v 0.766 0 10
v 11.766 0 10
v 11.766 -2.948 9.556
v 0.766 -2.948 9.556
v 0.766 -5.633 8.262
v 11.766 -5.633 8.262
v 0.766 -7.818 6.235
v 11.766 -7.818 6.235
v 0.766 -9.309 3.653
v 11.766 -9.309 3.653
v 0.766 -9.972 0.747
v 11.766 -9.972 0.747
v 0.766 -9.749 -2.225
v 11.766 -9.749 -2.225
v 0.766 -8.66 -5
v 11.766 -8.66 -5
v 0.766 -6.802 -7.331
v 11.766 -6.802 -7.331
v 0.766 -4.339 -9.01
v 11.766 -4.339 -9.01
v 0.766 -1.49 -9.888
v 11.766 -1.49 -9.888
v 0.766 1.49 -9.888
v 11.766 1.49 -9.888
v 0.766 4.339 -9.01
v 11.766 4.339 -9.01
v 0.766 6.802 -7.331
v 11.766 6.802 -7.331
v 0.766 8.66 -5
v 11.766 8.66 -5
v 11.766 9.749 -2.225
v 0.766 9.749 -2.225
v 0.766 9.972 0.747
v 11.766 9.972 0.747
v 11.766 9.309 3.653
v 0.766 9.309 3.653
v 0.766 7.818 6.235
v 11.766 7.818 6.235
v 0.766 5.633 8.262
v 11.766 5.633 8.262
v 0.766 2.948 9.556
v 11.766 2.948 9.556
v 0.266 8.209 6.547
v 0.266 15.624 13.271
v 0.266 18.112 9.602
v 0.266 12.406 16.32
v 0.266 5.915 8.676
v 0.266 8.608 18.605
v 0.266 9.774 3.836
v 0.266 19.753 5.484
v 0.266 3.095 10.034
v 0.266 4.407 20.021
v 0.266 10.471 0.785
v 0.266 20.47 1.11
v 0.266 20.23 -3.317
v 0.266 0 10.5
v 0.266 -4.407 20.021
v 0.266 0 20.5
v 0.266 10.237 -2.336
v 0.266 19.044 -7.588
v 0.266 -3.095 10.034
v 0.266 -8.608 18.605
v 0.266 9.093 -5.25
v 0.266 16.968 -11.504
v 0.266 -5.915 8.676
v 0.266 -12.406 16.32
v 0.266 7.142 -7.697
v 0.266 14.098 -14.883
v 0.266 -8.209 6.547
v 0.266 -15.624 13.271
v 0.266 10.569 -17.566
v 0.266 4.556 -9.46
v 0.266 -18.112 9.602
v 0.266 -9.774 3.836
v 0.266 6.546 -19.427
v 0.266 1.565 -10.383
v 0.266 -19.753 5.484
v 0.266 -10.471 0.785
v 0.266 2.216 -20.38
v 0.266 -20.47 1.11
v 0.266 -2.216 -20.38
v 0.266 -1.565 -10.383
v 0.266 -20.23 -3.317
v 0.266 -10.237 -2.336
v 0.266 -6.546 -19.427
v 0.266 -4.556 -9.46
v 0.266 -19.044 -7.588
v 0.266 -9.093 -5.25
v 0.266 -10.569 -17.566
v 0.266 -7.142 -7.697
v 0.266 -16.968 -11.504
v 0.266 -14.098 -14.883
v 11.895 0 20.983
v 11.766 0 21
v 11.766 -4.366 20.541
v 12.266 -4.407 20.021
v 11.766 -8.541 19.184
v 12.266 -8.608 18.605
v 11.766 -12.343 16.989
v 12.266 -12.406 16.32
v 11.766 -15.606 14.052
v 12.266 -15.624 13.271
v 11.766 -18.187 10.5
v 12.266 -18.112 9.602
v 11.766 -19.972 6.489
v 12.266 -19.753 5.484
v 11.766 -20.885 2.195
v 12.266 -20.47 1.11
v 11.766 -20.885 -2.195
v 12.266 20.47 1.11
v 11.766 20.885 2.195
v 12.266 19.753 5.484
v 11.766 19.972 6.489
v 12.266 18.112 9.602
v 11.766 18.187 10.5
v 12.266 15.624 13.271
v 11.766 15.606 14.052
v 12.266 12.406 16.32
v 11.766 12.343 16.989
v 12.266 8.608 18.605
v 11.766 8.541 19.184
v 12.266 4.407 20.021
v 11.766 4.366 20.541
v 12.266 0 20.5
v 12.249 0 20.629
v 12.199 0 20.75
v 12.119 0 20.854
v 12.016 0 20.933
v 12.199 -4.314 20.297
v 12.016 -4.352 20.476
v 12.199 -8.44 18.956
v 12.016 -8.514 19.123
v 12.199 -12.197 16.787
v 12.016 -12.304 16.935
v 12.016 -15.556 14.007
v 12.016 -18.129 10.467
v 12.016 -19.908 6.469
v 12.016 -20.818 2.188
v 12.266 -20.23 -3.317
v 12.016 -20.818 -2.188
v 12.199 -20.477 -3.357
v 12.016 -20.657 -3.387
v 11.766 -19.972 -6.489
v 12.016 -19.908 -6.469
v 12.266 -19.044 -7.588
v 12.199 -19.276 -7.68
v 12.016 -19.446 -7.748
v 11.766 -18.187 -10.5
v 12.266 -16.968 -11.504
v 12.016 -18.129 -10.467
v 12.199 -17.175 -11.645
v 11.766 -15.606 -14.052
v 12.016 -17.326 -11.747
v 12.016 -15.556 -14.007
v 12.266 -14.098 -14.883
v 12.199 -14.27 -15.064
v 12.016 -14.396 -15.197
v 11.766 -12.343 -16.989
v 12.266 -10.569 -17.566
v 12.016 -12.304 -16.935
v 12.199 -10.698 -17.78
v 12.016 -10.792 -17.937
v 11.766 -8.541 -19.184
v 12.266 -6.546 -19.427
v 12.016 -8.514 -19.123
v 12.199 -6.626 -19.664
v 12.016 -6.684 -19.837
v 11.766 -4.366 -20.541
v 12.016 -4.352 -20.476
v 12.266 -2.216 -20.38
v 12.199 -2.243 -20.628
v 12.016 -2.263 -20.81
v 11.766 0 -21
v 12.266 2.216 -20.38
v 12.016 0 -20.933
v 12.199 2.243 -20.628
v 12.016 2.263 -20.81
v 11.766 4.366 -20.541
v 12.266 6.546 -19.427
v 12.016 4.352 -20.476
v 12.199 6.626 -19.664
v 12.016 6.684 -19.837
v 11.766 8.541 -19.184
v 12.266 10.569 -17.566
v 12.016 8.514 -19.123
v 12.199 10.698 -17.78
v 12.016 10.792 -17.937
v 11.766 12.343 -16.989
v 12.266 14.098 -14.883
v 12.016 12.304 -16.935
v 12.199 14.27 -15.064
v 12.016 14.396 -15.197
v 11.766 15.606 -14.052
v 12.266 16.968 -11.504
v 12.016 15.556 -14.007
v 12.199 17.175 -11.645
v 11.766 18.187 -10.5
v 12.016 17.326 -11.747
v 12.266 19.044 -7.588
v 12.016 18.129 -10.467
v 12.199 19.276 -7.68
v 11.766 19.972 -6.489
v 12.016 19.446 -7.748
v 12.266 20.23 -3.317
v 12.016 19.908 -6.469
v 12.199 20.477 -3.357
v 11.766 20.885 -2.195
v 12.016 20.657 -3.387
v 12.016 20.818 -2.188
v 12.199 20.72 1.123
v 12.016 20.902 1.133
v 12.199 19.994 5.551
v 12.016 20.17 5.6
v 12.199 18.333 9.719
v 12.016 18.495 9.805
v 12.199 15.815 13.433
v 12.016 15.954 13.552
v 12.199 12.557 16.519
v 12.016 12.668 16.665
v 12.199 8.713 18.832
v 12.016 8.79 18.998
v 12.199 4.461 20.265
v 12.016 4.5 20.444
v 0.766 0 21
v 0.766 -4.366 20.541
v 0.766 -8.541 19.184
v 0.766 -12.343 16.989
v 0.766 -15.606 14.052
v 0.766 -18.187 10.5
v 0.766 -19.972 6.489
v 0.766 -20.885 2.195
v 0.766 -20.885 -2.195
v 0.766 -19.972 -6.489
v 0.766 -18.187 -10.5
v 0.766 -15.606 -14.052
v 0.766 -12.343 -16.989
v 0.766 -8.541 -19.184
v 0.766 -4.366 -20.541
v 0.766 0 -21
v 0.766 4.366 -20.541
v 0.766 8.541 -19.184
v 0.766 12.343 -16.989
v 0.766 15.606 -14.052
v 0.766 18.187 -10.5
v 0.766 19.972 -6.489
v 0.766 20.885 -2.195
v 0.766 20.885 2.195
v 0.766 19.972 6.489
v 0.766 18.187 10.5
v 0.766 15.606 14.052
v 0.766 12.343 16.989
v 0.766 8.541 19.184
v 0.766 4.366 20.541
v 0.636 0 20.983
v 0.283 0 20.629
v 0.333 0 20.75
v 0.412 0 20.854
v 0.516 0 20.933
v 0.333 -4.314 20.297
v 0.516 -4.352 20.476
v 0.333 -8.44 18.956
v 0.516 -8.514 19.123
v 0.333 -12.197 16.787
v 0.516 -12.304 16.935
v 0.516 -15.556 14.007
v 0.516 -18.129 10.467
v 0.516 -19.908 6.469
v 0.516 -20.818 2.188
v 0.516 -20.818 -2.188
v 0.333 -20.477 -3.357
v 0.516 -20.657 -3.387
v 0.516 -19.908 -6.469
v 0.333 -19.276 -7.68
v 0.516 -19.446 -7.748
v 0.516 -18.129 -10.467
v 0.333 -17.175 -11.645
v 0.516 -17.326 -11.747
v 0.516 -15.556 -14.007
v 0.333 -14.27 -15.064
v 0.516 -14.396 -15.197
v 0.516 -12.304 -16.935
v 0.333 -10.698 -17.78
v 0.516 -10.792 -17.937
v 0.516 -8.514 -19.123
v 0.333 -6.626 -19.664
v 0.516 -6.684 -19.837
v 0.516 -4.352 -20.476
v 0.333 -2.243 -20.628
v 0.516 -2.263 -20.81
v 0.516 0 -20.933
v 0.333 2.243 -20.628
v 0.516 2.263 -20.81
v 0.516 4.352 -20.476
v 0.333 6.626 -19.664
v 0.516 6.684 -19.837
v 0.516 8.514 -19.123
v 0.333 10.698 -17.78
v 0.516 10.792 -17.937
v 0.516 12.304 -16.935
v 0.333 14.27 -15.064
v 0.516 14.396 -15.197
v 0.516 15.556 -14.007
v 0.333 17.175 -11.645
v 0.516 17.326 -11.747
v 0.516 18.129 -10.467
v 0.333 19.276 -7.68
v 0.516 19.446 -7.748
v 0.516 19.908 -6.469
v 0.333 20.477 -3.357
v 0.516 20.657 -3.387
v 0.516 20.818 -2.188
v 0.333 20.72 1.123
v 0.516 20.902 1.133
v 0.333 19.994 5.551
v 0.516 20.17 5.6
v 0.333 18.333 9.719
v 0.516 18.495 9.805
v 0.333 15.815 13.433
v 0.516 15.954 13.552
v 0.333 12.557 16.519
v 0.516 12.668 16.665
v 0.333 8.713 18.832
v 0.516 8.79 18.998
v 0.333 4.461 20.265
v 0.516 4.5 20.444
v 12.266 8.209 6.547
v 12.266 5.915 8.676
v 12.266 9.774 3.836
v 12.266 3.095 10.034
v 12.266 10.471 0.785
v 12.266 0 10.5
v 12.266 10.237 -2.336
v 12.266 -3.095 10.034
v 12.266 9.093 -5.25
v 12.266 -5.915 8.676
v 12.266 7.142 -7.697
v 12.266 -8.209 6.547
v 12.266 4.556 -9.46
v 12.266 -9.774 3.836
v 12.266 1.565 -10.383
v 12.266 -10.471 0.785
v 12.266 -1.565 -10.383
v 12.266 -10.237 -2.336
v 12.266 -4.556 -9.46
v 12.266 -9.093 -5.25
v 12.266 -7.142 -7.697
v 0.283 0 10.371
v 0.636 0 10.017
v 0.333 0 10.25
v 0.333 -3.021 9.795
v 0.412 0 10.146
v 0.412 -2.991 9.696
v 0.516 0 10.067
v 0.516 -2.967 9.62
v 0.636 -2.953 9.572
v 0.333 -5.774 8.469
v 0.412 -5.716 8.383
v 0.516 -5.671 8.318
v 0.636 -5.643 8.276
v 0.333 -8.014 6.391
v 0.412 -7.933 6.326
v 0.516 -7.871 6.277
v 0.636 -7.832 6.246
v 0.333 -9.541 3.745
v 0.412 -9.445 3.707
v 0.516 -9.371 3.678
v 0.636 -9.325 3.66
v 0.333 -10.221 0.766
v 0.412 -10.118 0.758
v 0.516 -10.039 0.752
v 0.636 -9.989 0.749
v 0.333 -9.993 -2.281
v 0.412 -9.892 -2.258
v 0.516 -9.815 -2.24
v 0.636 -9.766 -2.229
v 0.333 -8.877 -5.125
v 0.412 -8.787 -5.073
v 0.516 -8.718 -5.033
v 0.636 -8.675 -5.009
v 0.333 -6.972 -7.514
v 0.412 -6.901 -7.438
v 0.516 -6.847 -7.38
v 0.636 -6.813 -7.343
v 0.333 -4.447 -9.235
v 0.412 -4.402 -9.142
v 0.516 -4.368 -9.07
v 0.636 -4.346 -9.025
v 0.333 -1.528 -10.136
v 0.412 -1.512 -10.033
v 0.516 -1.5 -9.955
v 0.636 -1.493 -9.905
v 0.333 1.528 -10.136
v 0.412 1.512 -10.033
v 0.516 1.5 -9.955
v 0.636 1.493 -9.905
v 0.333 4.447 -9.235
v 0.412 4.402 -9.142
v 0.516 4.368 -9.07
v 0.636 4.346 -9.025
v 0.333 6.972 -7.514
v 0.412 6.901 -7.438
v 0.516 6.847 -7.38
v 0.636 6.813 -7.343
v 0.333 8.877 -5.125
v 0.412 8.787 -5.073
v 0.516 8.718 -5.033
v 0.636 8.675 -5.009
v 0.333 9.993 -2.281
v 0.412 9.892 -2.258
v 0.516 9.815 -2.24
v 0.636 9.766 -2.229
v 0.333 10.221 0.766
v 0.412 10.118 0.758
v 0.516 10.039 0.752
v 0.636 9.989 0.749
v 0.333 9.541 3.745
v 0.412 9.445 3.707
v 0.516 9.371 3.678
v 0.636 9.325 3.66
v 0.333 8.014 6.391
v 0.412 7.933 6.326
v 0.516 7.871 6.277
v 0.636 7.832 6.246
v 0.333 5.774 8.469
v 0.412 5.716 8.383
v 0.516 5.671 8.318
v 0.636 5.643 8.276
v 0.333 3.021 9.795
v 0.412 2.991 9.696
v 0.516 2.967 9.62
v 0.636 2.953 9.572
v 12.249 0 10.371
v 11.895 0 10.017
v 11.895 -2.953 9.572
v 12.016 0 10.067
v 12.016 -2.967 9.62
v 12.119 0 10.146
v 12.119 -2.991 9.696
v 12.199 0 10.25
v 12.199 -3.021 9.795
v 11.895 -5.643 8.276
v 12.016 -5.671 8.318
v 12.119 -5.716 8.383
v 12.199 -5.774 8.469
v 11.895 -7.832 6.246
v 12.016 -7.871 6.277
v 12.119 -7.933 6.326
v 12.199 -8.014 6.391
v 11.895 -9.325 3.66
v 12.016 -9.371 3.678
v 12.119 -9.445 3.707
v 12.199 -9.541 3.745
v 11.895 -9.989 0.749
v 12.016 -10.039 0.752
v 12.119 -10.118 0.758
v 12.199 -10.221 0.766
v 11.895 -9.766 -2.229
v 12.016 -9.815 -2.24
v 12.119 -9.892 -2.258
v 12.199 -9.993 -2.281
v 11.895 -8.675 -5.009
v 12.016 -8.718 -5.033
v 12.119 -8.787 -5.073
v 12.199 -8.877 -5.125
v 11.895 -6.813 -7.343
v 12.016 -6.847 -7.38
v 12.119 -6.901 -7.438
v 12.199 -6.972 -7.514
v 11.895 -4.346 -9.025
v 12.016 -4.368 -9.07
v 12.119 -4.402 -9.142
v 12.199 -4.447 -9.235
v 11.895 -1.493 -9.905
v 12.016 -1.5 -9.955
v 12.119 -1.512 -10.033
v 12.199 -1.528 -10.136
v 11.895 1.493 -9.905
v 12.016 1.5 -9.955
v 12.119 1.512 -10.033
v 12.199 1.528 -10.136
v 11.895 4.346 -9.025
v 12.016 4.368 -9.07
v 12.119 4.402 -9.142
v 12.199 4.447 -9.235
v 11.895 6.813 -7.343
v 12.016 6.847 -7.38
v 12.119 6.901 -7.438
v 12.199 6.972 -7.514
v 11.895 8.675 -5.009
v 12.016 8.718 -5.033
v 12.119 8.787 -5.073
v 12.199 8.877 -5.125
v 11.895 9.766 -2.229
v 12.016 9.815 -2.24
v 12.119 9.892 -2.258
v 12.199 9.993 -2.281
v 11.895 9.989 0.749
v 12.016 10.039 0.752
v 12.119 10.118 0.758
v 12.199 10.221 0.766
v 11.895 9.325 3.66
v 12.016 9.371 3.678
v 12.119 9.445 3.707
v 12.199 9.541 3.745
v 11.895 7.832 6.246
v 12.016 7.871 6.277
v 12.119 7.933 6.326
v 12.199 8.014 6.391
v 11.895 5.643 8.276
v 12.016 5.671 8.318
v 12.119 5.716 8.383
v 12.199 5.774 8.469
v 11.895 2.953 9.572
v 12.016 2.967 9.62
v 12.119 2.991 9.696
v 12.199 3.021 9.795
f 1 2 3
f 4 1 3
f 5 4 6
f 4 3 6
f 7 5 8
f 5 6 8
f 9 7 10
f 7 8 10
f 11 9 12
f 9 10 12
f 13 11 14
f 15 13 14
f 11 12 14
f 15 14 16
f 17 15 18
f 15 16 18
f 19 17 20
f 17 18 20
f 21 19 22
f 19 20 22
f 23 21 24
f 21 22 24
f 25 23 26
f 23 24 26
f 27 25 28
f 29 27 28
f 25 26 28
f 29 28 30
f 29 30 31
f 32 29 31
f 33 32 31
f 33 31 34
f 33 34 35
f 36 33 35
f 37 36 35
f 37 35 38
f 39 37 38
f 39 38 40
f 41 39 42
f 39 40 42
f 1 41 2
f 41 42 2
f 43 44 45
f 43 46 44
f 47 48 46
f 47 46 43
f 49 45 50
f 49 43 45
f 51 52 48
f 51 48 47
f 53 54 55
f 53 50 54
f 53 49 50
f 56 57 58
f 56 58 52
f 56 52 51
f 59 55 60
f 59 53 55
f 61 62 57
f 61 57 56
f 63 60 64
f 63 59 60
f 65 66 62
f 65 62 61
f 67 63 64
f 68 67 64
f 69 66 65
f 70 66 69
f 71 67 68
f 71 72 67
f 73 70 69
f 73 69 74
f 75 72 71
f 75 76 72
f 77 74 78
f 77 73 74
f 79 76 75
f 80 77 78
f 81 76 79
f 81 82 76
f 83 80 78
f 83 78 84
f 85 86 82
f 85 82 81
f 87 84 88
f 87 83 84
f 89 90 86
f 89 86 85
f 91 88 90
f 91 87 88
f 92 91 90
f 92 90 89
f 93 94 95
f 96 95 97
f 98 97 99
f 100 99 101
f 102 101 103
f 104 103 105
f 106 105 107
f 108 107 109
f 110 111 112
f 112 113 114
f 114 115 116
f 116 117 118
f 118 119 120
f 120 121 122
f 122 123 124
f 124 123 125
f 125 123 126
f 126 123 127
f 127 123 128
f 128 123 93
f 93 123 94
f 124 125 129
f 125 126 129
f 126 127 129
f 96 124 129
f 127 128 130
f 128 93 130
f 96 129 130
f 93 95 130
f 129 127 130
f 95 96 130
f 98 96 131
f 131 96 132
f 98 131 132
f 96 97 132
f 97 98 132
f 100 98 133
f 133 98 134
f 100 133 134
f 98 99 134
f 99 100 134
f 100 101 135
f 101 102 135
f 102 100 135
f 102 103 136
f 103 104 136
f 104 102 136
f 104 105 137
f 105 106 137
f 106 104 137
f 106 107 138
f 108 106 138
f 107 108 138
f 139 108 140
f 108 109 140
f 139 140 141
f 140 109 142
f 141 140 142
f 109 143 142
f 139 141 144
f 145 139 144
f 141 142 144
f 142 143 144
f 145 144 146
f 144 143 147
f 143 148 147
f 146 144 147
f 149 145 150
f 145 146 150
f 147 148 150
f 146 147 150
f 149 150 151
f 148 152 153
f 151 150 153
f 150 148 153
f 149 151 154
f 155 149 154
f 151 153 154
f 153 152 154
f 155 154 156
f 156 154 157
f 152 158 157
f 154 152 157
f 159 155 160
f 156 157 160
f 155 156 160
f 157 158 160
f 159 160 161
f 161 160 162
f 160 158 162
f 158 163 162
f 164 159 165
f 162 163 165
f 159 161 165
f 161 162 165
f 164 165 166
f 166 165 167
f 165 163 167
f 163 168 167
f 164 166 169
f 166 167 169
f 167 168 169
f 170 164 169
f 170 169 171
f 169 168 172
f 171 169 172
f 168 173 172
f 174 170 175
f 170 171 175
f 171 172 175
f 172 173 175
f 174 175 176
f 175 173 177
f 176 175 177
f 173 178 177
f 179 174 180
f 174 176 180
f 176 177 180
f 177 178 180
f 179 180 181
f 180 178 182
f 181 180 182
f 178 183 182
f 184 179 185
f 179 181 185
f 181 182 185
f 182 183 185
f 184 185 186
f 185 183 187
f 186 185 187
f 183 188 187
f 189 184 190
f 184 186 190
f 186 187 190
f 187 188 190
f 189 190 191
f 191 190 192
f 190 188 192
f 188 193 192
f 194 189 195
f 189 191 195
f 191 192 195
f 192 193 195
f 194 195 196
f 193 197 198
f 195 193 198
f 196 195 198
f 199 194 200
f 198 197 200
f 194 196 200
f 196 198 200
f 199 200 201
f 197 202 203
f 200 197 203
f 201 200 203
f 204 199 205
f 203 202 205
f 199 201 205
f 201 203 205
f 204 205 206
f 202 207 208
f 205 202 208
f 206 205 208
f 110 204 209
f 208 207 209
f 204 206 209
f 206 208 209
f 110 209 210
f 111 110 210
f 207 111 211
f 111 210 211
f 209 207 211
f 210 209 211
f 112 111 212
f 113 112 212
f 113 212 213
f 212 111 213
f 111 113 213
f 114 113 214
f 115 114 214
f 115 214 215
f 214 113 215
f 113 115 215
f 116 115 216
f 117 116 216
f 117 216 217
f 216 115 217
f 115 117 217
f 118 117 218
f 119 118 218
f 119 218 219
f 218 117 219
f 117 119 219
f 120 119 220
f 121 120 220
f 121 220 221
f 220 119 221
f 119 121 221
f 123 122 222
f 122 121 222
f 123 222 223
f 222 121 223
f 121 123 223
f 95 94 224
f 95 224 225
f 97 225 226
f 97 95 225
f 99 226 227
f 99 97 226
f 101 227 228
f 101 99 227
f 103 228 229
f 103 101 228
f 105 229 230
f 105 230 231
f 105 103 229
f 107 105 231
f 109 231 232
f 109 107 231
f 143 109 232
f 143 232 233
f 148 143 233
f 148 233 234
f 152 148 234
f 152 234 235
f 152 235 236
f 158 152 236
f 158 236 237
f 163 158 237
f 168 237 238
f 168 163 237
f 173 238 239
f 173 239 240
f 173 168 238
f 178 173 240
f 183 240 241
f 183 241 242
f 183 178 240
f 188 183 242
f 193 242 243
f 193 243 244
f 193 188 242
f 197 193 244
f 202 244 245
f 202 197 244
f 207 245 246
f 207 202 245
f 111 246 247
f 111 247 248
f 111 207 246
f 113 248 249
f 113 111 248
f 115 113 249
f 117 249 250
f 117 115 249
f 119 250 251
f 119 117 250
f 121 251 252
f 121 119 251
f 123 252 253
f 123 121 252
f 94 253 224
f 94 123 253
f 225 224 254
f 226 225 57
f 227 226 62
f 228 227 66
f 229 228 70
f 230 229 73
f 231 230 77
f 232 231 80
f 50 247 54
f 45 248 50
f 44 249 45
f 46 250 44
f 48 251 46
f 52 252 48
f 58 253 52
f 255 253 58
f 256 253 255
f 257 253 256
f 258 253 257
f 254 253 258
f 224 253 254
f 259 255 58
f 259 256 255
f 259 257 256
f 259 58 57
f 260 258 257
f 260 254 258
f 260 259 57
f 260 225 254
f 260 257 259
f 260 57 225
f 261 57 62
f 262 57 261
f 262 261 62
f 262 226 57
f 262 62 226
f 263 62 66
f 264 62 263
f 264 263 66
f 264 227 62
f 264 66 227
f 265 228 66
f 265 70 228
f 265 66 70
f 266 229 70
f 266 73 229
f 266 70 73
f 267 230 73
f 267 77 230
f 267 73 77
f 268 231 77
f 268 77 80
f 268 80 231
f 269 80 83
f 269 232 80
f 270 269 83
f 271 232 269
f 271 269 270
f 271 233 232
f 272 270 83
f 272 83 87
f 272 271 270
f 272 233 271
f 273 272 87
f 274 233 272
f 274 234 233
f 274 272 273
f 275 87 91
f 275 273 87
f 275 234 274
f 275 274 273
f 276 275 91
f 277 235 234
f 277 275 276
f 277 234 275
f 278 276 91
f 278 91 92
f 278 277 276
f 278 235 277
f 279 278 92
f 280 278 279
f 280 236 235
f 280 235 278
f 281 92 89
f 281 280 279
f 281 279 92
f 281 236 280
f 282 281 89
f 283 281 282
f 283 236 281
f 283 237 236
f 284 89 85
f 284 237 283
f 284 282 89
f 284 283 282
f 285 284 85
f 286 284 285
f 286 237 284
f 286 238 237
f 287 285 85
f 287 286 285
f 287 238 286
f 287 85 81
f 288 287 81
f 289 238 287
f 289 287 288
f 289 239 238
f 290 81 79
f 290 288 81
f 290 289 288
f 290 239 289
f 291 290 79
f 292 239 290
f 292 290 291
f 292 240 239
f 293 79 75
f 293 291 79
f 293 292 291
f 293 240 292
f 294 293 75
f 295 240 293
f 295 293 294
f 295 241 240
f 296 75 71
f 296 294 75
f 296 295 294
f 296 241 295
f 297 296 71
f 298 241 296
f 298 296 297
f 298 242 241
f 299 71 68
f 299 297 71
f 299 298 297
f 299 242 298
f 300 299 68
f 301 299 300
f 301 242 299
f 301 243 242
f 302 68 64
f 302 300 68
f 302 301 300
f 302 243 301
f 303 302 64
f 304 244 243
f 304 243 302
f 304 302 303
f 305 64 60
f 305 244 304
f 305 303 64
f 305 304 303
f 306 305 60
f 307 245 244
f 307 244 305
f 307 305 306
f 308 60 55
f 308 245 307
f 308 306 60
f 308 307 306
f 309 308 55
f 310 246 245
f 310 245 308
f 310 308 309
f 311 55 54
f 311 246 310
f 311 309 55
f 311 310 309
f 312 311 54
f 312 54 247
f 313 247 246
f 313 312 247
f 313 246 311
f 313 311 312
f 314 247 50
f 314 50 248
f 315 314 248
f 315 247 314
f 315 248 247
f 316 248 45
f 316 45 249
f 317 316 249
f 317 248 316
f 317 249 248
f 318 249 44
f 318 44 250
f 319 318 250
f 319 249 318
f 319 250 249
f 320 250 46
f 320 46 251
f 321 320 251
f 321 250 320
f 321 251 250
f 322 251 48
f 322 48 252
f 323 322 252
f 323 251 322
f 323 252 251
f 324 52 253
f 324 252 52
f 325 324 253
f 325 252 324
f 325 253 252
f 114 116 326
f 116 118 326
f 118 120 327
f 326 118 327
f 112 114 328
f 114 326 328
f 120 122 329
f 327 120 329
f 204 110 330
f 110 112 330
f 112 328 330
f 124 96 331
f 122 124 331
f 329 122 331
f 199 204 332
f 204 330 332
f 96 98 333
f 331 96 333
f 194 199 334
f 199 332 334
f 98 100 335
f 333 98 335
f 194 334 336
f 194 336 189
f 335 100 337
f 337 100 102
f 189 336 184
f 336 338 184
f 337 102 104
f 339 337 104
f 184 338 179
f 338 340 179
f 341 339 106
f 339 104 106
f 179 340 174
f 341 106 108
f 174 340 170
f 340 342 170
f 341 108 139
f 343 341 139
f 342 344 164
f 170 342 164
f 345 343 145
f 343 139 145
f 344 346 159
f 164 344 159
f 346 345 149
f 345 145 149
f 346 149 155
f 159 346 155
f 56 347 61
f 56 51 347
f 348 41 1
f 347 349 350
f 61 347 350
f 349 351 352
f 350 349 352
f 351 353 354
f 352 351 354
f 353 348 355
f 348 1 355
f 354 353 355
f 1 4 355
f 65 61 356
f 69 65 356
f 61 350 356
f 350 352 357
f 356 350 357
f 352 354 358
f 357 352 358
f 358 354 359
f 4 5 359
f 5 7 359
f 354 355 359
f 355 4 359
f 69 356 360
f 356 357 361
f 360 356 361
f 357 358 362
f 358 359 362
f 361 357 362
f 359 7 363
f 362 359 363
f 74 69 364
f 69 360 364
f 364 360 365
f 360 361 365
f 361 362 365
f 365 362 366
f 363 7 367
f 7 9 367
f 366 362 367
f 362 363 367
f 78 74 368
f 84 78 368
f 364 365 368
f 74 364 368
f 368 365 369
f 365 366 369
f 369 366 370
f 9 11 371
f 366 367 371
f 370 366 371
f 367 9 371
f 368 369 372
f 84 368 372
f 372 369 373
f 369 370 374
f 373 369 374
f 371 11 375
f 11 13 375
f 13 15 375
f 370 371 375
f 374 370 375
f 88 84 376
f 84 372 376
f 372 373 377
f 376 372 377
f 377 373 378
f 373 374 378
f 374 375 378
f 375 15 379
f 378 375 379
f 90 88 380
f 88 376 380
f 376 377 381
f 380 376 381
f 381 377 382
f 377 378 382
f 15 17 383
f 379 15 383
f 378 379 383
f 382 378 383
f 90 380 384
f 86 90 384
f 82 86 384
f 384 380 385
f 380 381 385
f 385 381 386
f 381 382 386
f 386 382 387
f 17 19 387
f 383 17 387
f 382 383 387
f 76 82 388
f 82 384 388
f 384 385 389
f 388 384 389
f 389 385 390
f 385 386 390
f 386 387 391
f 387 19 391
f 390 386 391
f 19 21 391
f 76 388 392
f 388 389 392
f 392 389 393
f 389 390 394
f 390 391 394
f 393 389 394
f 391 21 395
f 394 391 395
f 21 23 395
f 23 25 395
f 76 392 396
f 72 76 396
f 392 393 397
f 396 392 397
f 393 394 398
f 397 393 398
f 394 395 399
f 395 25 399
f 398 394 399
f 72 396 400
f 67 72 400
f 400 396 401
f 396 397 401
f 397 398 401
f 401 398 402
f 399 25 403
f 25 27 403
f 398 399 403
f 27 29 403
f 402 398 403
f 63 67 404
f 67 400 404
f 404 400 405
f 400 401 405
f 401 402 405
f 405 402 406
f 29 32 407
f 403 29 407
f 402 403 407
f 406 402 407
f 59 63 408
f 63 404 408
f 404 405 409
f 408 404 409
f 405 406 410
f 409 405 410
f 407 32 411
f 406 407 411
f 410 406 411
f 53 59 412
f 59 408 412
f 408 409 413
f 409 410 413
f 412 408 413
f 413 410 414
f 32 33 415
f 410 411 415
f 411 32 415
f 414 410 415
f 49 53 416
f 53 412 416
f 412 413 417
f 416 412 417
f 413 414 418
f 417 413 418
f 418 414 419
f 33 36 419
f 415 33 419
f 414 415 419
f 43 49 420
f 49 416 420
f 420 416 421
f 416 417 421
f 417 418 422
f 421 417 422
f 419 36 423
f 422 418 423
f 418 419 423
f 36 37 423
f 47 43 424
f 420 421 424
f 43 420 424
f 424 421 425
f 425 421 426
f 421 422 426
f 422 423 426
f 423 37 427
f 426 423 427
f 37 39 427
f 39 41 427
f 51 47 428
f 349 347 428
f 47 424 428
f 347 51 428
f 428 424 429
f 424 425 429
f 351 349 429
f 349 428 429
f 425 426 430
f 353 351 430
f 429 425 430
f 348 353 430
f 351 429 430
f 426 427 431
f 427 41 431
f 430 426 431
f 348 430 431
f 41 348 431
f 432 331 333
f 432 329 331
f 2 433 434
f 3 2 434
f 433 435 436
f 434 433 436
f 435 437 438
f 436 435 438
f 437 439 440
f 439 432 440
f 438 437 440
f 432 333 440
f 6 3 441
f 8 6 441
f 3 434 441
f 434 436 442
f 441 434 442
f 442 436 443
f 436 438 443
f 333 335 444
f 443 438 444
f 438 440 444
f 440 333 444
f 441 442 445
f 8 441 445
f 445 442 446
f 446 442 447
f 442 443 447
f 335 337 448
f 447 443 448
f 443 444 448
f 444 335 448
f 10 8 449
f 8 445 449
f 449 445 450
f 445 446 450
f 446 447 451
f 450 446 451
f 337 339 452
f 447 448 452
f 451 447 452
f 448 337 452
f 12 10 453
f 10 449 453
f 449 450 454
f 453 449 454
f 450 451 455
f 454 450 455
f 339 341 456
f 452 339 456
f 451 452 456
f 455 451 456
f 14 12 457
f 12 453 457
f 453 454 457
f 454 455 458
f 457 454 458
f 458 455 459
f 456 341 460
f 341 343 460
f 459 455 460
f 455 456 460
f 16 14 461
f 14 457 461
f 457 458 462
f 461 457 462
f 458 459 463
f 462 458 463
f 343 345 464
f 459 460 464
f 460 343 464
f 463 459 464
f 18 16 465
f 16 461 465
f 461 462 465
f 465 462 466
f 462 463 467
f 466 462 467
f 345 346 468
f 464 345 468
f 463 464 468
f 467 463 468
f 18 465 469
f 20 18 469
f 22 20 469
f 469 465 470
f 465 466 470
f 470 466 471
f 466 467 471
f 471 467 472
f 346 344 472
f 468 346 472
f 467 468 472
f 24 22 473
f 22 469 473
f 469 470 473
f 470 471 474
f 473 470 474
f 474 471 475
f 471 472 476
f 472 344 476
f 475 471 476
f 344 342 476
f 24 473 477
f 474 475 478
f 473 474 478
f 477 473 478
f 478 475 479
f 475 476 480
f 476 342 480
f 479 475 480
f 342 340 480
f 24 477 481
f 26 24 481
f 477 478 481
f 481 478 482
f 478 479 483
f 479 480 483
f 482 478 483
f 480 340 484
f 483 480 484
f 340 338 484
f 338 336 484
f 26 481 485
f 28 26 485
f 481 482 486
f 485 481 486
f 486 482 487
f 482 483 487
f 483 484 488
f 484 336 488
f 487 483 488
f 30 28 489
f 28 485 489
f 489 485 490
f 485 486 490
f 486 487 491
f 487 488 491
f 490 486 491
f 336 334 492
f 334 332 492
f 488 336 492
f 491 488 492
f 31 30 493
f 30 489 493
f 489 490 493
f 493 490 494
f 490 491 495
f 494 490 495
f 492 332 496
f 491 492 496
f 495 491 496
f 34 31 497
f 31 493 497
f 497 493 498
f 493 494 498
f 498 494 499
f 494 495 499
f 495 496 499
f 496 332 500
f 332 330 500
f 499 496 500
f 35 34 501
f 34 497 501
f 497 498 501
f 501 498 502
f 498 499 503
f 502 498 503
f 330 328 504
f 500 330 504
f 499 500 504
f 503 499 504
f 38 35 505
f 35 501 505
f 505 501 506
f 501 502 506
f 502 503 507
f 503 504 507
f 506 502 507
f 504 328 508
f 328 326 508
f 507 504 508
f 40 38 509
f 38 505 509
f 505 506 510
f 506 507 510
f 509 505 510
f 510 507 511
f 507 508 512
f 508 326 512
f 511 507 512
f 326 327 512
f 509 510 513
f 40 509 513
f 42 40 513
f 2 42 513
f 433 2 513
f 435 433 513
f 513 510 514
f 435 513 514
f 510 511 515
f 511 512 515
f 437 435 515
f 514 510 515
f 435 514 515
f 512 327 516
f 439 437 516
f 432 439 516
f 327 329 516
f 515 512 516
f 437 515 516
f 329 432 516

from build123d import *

# Parameters (mm, degrees)
F0_W = 12
F0_H = 11
F2_R = 0.5


with BuildPart() as f1:
    # F0 (on Front) → F1 (revolve)
    with BuildSketch(Plane.XZ):
        with Locations((6.26556, 15.5)):
            Rectangle(F0_W, F0_H)
    revolve(axis=Axis((2.772328, 0, 0), (1, 0, 0)))

    # F2
    f2_edges = [f1.edges().sort_by_distance(p)[0] for p in [
        (12.26556, 0, -21),
        (0.26556, 0, -21),
        (6.26556, 0, 21),
        (0.26556, 0, -10),
        (12.26556, 0, -10),
        (6.26556, 0, 10),
    ]]
    fillet(f2_edges, radius=F2_R)


solid = f1.part
